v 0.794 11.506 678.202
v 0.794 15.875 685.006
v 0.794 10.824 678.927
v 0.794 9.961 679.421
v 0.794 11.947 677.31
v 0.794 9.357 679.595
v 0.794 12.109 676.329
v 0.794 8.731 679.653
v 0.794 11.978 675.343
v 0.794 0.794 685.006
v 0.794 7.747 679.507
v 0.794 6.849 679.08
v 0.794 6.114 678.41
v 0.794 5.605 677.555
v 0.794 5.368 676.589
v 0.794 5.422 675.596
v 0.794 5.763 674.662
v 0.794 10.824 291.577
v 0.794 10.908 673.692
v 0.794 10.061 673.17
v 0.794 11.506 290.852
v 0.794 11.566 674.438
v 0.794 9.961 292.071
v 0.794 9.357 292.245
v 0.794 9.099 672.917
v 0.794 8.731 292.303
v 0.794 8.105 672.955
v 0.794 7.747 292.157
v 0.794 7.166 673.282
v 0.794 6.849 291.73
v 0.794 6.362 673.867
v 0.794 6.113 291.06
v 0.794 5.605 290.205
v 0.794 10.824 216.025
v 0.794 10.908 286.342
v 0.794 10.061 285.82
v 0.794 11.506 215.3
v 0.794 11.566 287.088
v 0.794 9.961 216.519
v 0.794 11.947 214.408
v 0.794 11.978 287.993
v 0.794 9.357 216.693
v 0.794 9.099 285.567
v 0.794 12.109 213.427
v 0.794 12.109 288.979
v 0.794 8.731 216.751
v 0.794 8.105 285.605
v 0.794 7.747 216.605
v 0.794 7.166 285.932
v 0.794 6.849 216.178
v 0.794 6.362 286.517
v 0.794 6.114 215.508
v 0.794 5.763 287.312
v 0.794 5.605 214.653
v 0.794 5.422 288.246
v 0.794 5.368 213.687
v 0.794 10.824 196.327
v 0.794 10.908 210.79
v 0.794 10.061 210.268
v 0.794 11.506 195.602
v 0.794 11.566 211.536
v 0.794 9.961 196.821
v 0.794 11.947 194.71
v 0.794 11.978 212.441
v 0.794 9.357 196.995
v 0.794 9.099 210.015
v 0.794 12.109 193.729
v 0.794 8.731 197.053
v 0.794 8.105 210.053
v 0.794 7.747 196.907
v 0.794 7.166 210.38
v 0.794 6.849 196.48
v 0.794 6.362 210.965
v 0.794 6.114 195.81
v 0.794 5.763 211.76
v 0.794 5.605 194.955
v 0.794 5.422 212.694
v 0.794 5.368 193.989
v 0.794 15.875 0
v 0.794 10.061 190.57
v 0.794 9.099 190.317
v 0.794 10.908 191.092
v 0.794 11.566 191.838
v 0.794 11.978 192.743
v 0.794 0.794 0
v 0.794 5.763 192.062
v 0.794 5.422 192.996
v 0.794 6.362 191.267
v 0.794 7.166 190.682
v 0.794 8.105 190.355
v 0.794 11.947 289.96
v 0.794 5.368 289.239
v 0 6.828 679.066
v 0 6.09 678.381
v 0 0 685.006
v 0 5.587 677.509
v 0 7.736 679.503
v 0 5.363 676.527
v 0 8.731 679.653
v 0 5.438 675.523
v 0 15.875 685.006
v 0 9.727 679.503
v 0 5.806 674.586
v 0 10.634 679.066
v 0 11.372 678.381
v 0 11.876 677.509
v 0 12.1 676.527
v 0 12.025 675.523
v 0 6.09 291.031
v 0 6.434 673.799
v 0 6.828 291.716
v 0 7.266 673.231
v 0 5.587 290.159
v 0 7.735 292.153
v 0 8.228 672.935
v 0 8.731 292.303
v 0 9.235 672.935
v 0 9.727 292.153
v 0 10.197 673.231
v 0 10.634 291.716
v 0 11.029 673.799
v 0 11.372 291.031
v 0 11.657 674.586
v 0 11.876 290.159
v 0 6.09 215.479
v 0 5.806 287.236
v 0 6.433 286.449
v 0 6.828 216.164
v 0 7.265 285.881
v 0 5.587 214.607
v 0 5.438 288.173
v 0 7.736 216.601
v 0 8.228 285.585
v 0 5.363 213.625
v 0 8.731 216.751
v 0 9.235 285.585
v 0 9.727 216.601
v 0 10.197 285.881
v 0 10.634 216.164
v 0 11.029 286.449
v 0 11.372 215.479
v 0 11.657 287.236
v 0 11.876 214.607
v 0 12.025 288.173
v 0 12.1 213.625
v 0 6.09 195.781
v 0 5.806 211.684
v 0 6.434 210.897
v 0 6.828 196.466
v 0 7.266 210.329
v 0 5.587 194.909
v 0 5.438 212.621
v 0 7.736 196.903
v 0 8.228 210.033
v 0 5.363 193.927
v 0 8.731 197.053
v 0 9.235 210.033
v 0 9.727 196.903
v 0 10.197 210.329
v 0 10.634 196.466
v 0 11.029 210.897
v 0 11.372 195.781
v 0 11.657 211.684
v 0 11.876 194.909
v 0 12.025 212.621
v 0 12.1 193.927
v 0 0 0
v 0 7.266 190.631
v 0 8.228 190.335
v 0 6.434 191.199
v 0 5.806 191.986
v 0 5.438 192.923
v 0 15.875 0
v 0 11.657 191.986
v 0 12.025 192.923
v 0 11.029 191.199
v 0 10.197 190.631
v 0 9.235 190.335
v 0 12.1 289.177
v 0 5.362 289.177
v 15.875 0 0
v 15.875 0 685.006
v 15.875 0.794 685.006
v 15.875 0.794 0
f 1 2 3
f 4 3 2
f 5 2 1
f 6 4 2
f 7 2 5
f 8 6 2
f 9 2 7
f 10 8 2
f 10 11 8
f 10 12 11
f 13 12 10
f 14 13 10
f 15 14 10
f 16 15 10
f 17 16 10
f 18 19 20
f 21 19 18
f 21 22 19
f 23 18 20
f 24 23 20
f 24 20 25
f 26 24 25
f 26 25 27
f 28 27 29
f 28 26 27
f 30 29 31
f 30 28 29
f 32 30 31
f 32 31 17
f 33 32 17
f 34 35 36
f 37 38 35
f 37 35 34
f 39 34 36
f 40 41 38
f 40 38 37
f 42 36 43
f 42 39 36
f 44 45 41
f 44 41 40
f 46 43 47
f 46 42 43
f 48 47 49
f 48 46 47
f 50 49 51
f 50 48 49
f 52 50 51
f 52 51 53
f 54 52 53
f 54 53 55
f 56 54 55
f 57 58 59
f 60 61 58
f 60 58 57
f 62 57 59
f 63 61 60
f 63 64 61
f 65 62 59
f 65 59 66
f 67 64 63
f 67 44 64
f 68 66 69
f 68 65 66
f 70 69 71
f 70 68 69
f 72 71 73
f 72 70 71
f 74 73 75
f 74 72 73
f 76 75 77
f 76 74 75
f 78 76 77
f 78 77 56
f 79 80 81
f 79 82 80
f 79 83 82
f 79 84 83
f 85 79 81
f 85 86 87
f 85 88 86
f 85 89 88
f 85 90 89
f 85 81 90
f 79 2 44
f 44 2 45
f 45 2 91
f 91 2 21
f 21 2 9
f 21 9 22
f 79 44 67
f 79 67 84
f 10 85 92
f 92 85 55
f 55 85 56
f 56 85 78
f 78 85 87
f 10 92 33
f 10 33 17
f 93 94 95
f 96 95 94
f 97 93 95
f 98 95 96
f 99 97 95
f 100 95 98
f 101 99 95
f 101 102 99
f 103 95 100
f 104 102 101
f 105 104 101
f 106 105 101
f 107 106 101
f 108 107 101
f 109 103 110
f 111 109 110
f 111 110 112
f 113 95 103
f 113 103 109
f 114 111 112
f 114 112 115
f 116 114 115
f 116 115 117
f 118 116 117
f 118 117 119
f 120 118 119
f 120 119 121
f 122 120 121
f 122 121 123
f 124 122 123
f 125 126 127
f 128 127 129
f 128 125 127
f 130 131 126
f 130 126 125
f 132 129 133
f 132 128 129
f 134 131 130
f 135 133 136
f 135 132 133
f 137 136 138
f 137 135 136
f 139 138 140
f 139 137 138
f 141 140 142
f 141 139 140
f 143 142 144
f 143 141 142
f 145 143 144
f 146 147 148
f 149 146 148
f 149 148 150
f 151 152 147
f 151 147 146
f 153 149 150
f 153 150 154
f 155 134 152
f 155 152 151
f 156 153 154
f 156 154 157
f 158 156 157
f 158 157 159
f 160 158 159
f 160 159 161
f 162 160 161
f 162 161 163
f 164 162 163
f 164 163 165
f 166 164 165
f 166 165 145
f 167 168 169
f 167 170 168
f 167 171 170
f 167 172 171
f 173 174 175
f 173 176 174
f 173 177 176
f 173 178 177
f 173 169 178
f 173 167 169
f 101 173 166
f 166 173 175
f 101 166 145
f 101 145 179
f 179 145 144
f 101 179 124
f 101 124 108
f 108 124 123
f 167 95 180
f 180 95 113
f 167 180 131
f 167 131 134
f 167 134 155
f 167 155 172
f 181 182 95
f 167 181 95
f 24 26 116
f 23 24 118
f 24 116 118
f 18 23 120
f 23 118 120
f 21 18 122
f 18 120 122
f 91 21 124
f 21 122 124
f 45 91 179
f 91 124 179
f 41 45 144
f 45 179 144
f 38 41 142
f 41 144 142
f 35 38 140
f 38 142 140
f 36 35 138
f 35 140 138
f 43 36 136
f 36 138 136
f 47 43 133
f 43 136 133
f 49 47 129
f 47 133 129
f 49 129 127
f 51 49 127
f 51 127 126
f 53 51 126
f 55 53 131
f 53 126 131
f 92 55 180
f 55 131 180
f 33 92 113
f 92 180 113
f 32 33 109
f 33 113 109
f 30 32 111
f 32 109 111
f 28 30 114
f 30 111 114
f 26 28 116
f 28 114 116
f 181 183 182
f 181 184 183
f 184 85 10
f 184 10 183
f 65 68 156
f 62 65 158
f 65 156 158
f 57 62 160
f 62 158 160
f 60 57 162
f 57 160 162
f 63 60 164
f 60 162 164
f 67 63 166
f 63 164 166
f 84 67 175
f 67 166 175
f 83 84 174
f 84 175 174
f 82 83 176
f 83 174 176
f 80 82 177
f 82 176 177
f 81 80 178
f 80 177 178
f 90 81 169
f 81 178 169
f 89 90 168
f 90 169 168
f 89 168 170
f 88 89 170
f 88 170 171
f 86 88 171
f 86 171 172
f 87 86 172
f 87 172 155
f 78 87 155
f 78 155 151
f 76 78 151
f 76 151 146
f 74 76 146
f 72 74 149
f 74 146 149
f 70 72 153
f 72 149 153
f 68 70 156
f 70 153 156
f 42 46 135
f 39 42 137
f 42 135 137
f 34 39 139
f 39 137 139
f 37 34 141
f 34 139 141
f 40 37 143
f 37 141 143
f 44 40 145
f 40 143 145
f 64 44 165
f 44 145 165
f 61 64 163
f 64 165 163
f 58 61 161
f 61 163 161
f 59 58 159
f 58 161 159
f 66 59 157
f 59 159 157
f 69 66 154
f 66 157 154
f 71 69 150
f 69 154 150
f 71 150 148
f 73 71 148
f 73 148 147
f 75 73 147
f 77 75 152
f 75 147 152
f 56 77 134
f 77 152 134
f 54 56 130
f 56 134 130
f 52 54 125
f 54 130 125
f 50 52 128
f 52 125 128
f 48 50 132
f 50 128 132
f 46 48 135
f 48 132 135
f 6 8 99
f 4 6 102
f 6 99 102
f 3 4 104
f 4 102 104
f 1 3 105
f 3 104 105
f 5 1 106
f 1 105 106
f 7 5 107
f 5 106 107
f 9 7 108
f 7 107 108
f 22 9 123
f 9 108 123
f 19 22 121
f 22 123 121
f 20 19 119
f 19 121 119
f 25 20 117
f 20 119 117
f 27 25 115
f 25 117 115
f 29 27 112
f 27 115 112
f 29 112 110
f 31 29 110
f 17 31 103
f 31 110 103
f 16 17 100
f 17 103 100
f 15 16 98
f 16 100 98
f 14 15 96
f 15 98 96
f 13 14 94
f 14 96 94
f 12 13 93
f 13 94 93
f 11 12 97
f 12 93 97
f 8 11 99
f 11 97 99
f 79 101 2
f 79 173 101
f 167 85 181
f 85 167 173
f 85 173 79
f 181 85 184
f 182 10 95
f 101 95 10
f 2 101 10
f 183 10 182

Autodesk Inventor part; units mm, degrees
ref_plane "YZ Plane" through (0, 0, 0) normal (1, 0, 0) x (0, 1, 0)
ref_plane "XZ Plane" through (0, 0, 0) normal (0, 1, 0) x (-1, 0, 0)
ref_plane "XY Plane" through (0, 0, 0) normal (0, 0, 1) x (1, 0, 0)
sketch "Sketch1" plane through (0, 0, 0) normal (0, 0, 1) x (1, 0, 0)
  line L0 (0, 0) -> (0, 15.875)
  line L1 (0, 15.875) -> (0.7937, 15.875)
  line L2 (0.7937, 15.875) -> (0.7938, 0.7937)
  line L3 (0.7938, 0.7937) -> (15.875, 0.7937)
  line L4 (15.875, 0.7937) -> (15.875, 0)
  line L5 (15.875, 0) -> (0, 0)
  dimension "d0" = 15.875
  dimension "d1" = 0.7937
extrude "Extrusion1" add sketch "Sketch1" along normal blind 685.0063
sketch "Sketch2" plane through (0, 0, 0) normal (-1, 0, 0) x (0, 0, 1)
  line L0 (288.925, 278.403) -> (593.725, 278.403) construction
  arc A0 (593.725, 278.403) -> (593.725, 285.1594) centre (593.725, 281.7812) ccw construction
  line L1 (593.725, 285.1594) -> (288.925, 285.1594) construction
  arc A1 (288.925, 285.1594) -> (288.925, 278.403) centre (288.925, 281.7812) ccw construction
  circle A2 centre (657.225, 281.7812) radius 3.3782 construction
  circle A3 centre (625.475, 281.7812) radius 3.3782 construction
  line L2 (669.925, 294.4812) -> (669.925, 484.9812) construction
  line L3 (669.925, 484.9812) -> (200.025, 484.9812) construction
  line L4 (200.025, 484.9812) -> (200.025, 294.4812) construction
  line L5 (200.025, 294.4812) -> (669.925, 294.4812) construction
  line L6 (288.925, 151.403) -> (593.725, 151.403) construction
  arc A4 (593.725, 151.403) -> (593.725, 158.1594) centre (593.725, 154.7812) ccw construction
  line L7 (593.725, 158.1594) -> (288.925, 158.1594) construction
  arc A5 (288.925, 158.1594) -> (288.925, 151.403) centre (288.925, 154.7812) ccw construction
  ellipse E0 centre (657.225, 154.7796) end of major axis (653.8468, 154.7796) minor radius 3.3782 construction
  ellipse E1 centre (625.475, 154.7796) end of major axis (628.8532, 154.7796) minor radius 3.3782 construction
  line L8 (669.925, 269.0812) -> (200.025, 269.0812) construction
  line L9 (200.025, 269.0812) -> (200.025, 167.4812) construction
  line L10 (200.025, 167.4812) -> (669.925, 167.4812) construction
  line L11 (669.925, 167.4812) -> (669.925, 269.0812) construction
  line L12 (669.925, 15.0813) -> (669.925, 142.0812) construction
  line L13 (669.925, 142.0812) -> (200.025, 142.0812) construction
  line L14 (200.025, 142.0812) -> (200.025, 15.0813) construction
  line L15 (200.025, 15.0813) -> (669.925, 15.0813) construction
  circle A6 centre (676.275, 396.0812) radius 3.3782 construction
  circle A7 centre (193.675, 396.0812) radius 3.3782 construction
  circle A8 centre (676.275, 407.9875) radius 3.3782 construction
  circle A9 centre (193.675, 407.9875) radius 3.3782 construction
  circle A10 centre (676.275, 419.8937) radius 3.3782 construction
  circle A11 centre (193.675, 419.8937) radius 3.3782 construction
  circle A12 centre (676.275, 431.8) radius 3.3782 construction
  circle A13 centre (193.675, 431.8) radius 3.3782 construction
  circle A14 centre (676.275, 443.7062) radius 3.3782 construction
  circle A15 centre (193.675, 443.7062) radius 3.3782 construction
  circle A16 centre (676.275, 455.6125) radius 3.3782 construction
  circle A17 centre (193.675, 455.6125) radius 3.3782 construction
  circle A18 centre (676.275, 467.5187) radius 3.3782 construction
  circle A19 centre (193.675, 467.5187) radius 3.3782 construction
  circle A20 centre (676.275, 479.425) radius 3.3782 construction
  circle A21 centre (193.675, 479.425) radius 3.3782 construction
  circle A22 centre (676.275, 385.0141) radius 3.3782 construction
  circle A23 centre (193.675, 385.0141) radius 3.3782 construction
  circle A24 centre (676.275, 373.947) radius 3.3782 construction
  circle A25 centre (193.675, 373.947) radius 3.3782 construction
  circle A26 centre (676.275, 362.8798) radius 3.3782 construction
  circle A27 centre (193.675, 362.8798) radius 3.3782 construction
  circle A28 centre (676.275, 351.8127) radius 3.3782 construction
  circle A29 centre (193.675, 351.8127) radius 3.3782 construction
  circle A30 centre (676.275, 340.7455) radius 3.3782 construction
  circle A31 centre (193.675, 340.7455) radius 3.3782 construction
  circle A32 centre (676.275, 329.6784) radius 3.3782 construction
  circle A33 centre (193.675, 329.6784) radius 3.3782 construction
  circle A34 centre (676.275, 318.6112) radius 3.3782 construction
  circle A35 centre (193.675, 318.6112) radius 3.3782 construction
  circle A36 centre (676.275, 307.5441) radius 3.3782 construction
  circle A37 centre (193.675, 307.5441) radius 3.3782 construction
  circle A38 centre (676.275, 296.477) radius 3.3782 construction
  circle A39 centre (193.675, 296.477) radius 3.3782 construction
  circle A40 centre (676.275, 285.4098) radius 3.3782 construction
  circle A41 centre (193.675, 285.4098) radius 3.3782 construction
  circle A42 centre (676.275, 274.3427) radius 3.3782 construction
  circle A43 centre (193.675, 274.3427) radius 3.3782 construction
  circle A44 centre (676.275, 263.2755) radius 3.3782 construction
  circle A45 centre (193.675, 263.2755) radius 3.3782 construction
  circle A46 centre (676.275, 252.2084) radius 3.3782 construction
  circle A47 centre (193.675, 252.2084) radius 3.3782 construction
  circle A48 centre (676.275, 241.1412) radius 3.3782 construction
  circle A49 centre (193.675, 241.1412) radius 3.3782 construction
  circle A50 centre (676.275, 230.0741) radius 3.3782 construction
  circle A51 centre (193.675, 230.0741) radius 3.3782 construction
  circle A52 centre (676.275, 219.007) radius 3.3782 construction
  circle A53 centre (193.675, 219.007) radius 3.3782 construction
  circle A54 centre (676.275, 207.9398) radius 3.3782 construction
  circle A55 centre (193.675, 207.9398) radius 3.3782 construction
  circle A56 centre (676.275, 196.8727) radius 3.3782 construction
  circle A57 centre (193.675, 196.8727) radius 3.3782 construction
  circle A58 centre (676.275, 185.8055) radius 3.3782 construction
  circle A59 centre (193.675, 185.8055) radius 3.3782 construction
  circle A60 centre (676.275, 174.7384) radius 3.3782 construction
  circle A61 centre (193.675, 174.7384) radius 3.3782 construction
  circle A62 centre (676.275, 163.6712) radius 3.3782 construction
  circle A63 centre (193.675, 163.6712) radius 3.3782 construction
  circle A64 centre (676.275, 152.6041) radius 3.3782 construction
  circle A65 centre (193.675, 152.6041) radius 3.3782 construction
  circle A66 centre (676.275, 141.537) radius 3.3782 construction
  circle A67 centre (193.675, 141.537) radius 3.3782 construction
  circle A68 centre (676.275, 130.4698) radius 3.3782 construction
  circle A69 centre (193.675, 130.4698) radius 3.3782 construction
  circle A70 centre (676.275, 119.4027) radius 3.3782 construction
  circle A71 centre (193.675, 119.4027) radius 3.3782 construction
  circle A72 centre (676.275, 108.3355) radius 3.3782 construction
  circle A73 centre (193.675, 108.3355) radius 3.3782 construction
  circle A74 centre (676.275, 97.2684) radius 3.3782 construction
  circle A75 centre (193.675, 97.2684) radius 3.3782 construction
  circle A76 centre (676.275, 86.2012) radius 3.3782 construction
  circle A77 centre (193.675, 86.2012) radius 3.3782 construction
  circle A78 centre (676.275, 75.1341) radius 3.3782 construction
  circle A79 centre (193.675, 75.1341) radius 3.3782 construction
  circle A80 centre (676.275, 64.067) radius 3.3782 construction
  circle A81 centre (193.675, 64.067) radius 3.3782 construction
  circle A82 centre (676.275, 52.9998) radius 3.3782 construction
  circle A83 centre (193.675, 52.9998) radius 3.3782 construction
  circle A84 centre (676.275, 41.9327) radius 3.3782 construction
  circle A85 centre (193.675, 41.9327) radius 3.3782 construction
  circle A86 centre (676.275, 30.8655) radius 3.3782 construction
  circle A87 centre (193.675, 30.8655) radius 3.3782 construction
  circle A88 centre (676.275, 19.7984) radius 3.3782 construction
  circle A89 centre (193.675, 19.7984) radius 3.3782 construction
  circle A90 centre (676.275, 491.3312) radius 3.3782 construction
  circle A91 centre (666.426, 491.3312) radius 3.3782 construction
  circle A92 centre (656.577, 491.3312) radius 3.3782 construction
  circle A93 centre (646.7281, 491.3312) radius 3.3782 construction
  circle A94 centre (636.8791, 491.3312) radius 3.3782 construction
  circle A95 centre (627.0301, 491.3312) radius 3.3782 construction
  circle A96 centre (617.1811, 491.3312) radius 3.3782 construction
  circle A97 centre (607.3321, 491.3312) radius 3.3782 construction
  circle A98 centre (597.4832, 491.3312) radius 3.3782 construction
  circle A99 centre (587.6342, 491.3312) radius 3.3782 construction
  circle A100 centre (577.7852, 491.3312) radius 3.3782 construction
  circle A101 centre (567.9362, 491.3312) radius 3.3782 construction
  circle A102 centre (558.0872, 491.3312) radius 3.3782 construction
  circle A103 centre (548.2383, 491.3312) radius 3.3782 construction
  circle A104 centre (538.3893, 491.3312) radius 3.3782 construction
  circle A105 centre (528.5403, 491.3312) radius 3.3782 construction
  circle A106 centre (518.6913, 491.3312) radius 3.3782 construction
  circle A107 centre (508.8423, 491.3312) radius 3.3782 construction
  circle A108 centre (498.9934, 491.3312) radius 3.3782 construction
  circle A109 centre (489.1444, 491.3312) radius 3.3782 construction
  circle A110 centre (479.2954, 491.3312) radius 3.3782 construction
  circle A111 centre (469.4464, 491.3312) radius 3.3782 construction
  circle A112 centre (459.5974, 491.3312) radius 3.3782 construction
  circle A113 centre (449.7485, 491.3312) radius 3.3782 construction
  circle A114 centre (439.8995, 491.3312) radius 3.3782 construction
  circle A115 centre (430.0505, 491.3312) radius 3.3782 construction
  circle A116 centre (420.2015, 491.3312) radius 3.3782 construction
  circle A117 centre (410.3526, 491.3312) radius 3.3782 construction
  circle A118 centre (400.5036, 491.3312) radius 3.3782 construction
  circle A119 centre (390.6546, 491.3312) radius 3.3782 construction
  circle A120 centre (380.8056, 491.3312) radius 3.3782 construction
  circle A121 centre (370.9566, 491.3312) radius 3.3782 construction
  circle A122 centre (361.1077, 491.3312) radius 3.3782 construction
  circle A123 centre (351.2587, 491.3312) radius 3.3782 construction
  circle A124 centre (341.4097, 491.3312) radius 3.3782 construction
  circle A125 centre (331.5607, 491.3312) radius 3.3782 construction
  circle A126 centre (321.7117, 491.3312) radius 3.3782 construction
  circle A127 centre (311.8628, 491.3312) radius 3.3782 construction
  circle A128 centre (302.0138, 491.3312) radius 3.3782 construction
  circle A129 centre (292.1648, 491.3312) radius 3.3782 construction
  circle A130 centre (282.3158, 491.3312) radius 3.3782 construction
  circle A131 centre (272.4668, 491.3312) radius 3.3782 construction
  circle A132 centre (262.6179, 491.3312) radius 3.3782 construction
  circle A133 centre (252.7689, 491.3312) radius 3.3782 construction
  circle A134 centre (242.9199, 491.3312) radius 3.3782 construction
  circle A135 centre (233.0709, 491.3312) radius 3.3782 construction
  circle A136 centre (223.2219, 491.3312) radius 3.3782 construction
  circle A137 centre (213.373, 491.3312) radius 3.3782 construction
  circle A138 centre (203.524, 491.3312) radius 3.3782 construction
  circle A139 centre (193.675, 491.3312) radius 3.3782 construction
  circle A140 centre (676.275, 8.7313) radius 3.3782 projected
  circle A141 centre (666.426, 8.7313) radius 3.3782 construction
  circle A142 centre (656.577, 8.7313) radius 3.3782 construction
  circle A143 centre (646.7281, 8.7313) radius 3.3782 construction
  circle A144 centre (636.8791, 8.7313) radius 3.3782 construction
  circle A145 centre (627.0301, 8.7313) radius 3.3782 construction
  circle A146 centre (617.1811, 8.7313) radius 3.3782 construction
  circle A147 centre (607.3321, 8.7313) radius 3.3782 construction
  circle A148 centre (597.4832, 8.7313) radius 3.3782 construction
  circle A149 centre (587.6342, 8.7313) radius 3.3782 construction
  circle A150 centre (577.7852, 8.7313) radius 3.3782 construction
  circle A151 centre (567.9362, 8.7313) radius 3.3782 construction
  circle A152 centre (558.0872, 8.7313) radius 3.3782 construction
  circle A153 centre (548.2383, 8.7313) radius 3.3782 construction
  circle A154 centre (538.3893, 8.7313) radius 3.3782 construction
  circle A155 centre (528.5403, 8.7313) radius 3.3782 construction
  circle A156 centre (518.6913, 8.7313) radius 3.3782 construction
  circle A157 centre (508.8423, 8.7313) radius 3.3782 construction
  circle A158 centre (498.9934, 8.7313) radius 3.3782 construction
  circle A159 centre (489.1444, 8.7313) radius 3.3782 construction
  circle A160 centre (479.2954, 8.7313) radius 3.3782 construction
  circle A161 centre (469.4464, 8.7313) radius 3.3782 construction
  circle A162 centre (459.5974, 8.7313) radius 3.3782 construction
  circle A163 centre (449.7485, 8.7313) radius 3.3782 construction
  circle A164 centre (439.8995, 8.7313) radius 3.3782 construction
  circle A165 centre (430.0505, 8.7313) radius 3.3782 construction
  circle A166 centre (420.2015, 8.7313) radius 3.3782 construction
  circle A167 centre (410.3526, 8.7313) radius 3.3782 construction
  circle A168 centre (400.5036, 8.7313) radius 3.3782 construction
  circle A169 centre (390.6546, 8.7313) radius 3.3782 construction
  circle A170 centre (380.8056, 8.7313) radius 3.3782 construction
  circle A171 centre (370.9566, 8.7313) radius 3.3782 construction
  circle A172 centre (361.1077, 8.7313) radius 3.3782 construction
  circle A173 centre (351.2587, 8.7313) radius 3.3782 construction
  circle A174 centre (341.4097, 8.7313) radius 3.3782 construction
  circle A175 centre (331.5607, 8.7313) radius 3.3782 construction
  circle A176 centre (321.7117, 8.7313) radius 3.3782 construction
  circle A177 centre (311.8628, 8.7313) radius 3.3782 construction
  circle A178 centre (302.0138, 8.7313) radius 3.3782 construction
  circle A179 centre (272.4668, 8.7313) radius 3.3782 construction
  circle A180 centre (262.6179, 8.7313) radius 3.3782 construction
  circle A181 centre (252.7689, 8.7313) radius 3.3782 construction
  circle A182 centre (242.9199, 8.7313) radius 3.3782 construction
  circle A183 centre (233.0709, 8.7313) radius 3.3782 construction
  circle A184 centre (223.2219, 8.7313) radius 3.3782 construction
  circle A185 centre (213.373, 8.7313) radius 3.3782 projected
  circle A186 centre (203.524, 8.7313) radius 3.3782 construction
  circle A187 centre (193.675, 8.7313) radius 3.3782 projected
  line L16 (682.625, 2.3813) -> (187.325, 2.3813) construction
  line L17 (187.325, 2.3813) -> (187.325, 497.6812) construction
  line L18 (187.325, 497.6812) -> (682.625, 497.6812) construction
  line L19 (682.625, 497.6812) -> (682.625, 2.3813) construction
  circle A188 centre (477.7908, 396.0812) radius 3.3782 construction
  circle A189 centre (398.6756, 286.3307) radius 3.3782 construction
  circle A190 centre (422.4733, 262.533) radius 3.3782 construction
  circle A191 centre (444.1358, 396.0812) radius 3.3782 construction
  line L20 (418.0849, 248.9608) -> (558.1878, 108.8579) construction
  arc A192 (558.1878, 108.8579) -> (576.1483, 126.8184) centre (288.925, 396.0812) ccw construction
  line L21 (576.1483, 126.8184) -> (323.3053, 379.6615) construction
  arc A193 (323.3053, 379.6615) -> (326.4921, 389.7312) centre (288.925, 396.0812) ccw construction
  line L22 (326.4921, 389.7312) -> (682.5738, 389.7312) construction
  arc A194 (682.5738, 389.7312) -> (682.625, 396.0812) centre (288.925, 396.0812) ccw construction
  line L23 (682.625, 396.0812) -> (682.625, 402.4312) construction
  line L24 (682.625, 402.4312) -> (326.4921, 402.4312) construction
  arc A195 (326.4921, 402.4312) -> (282.575, 358.5141) centre (288.925, 396.0812) ccw construction
  line L25 (282.575, 358.5141) -> (282.575, 296.4095) construction
  arc A196 (295.275, 281.641) -> (282.575, 296.4095) centre (178.435, 194.011) ccw construction
  line L26 (295.275, 281.641) -> (360.9975, 194.011) construction
  line L27 (360.9975, 194.011) -> (295.275, 106.381) construction
  arc A197 (282.575, 91.6124) -> (295.275, 106.381) centre (178.435, 194.011) ccw construction
  line L28 (282.575, 91.6124) -> (282.575, 2.3812) construction
  line L29 (282.575, 2.3812) -> (288.925, 2.3812) construction
  arc A198 (288.925, 2.3812) -> (295.275, 2.4325) centre (288.925, 396.0812) ccw construction
  line L30 (295.275, 2.4325) -> (295.275, 85.2143) construction
  line L31 (295.275, 85.2143) -> (418.0849, 248.9608) construction
  circle A199 centre (288.925, 8.7312) radius 3.3782 projected
  circle A200 centre (288.925, 59.5312) radius 3.3782 construction
  line L32 (409.0135, 258.0323) -> (368.935, 204.5943) construction
  line L33 (368.935, 204.5943) -> (295.275, 302.8076) construction
  line L34 (295.275, 302.8076) -> (295.275, 358.5141) construction
  arc A201 (295.275, 358.5141) -> (305.3447, 361.701) centre (288.925, 396.0812) ccw construction
  line L35 (305.3447, 361.701) -> (409.0135, 258.0323) construction
  circle A202 centre (288.925, 396.0812) radius 9.5 construction
  circle A203 centre (559.1526, 118.5617) radius 3.3782 construction
  circle A204 centre (566.4445, 125.8537) radius 3.3782 construction
  circle A205 centre (523.2315, 154.4828) radius 3.3782 construction
  circle A206 centre (530.5235, 161.7747) radius 3.3782 construction
  circle A207 centre (676.275, 396.0812) radius 3.3782 construction
  circle A208 centre (625.475, 396.0812) radius 3.3782 construction
  circle A209 centre (428.625, 396.0812) radius 3.3782 construction
  circle A210 centre (568.325, 396.0812) radius 3.3782 construction
  circle A211 centre (383.1156, 292.9104) radius 3.3782 construction
  circle A212 centre (392.0958, 301.8907) radius 3.3782 construction
  circle A213 centre (481.9495, 194.0765) radius 3.3782 construction
  circle A214 centre (490.9297, 203.0568) radius 3.3782 construction
  arc A215 (291.0239, 5.5515) -> (291.0239, 11.911) centre (292.1648, 8.7313) ccw projected
  arc A216 (285.3856, 10.1415) -> (285.3856, 7.321) centre (282.3158, 8.7313) ccw projected
  arc A217 (291.0239, 11.911) -> (285.3856, 10.1415) centre (288.925, 8.7312) ccw projected
  arc A218 (285.3856, 7.321) -> (291.0239, 5.5515) centre (288.925, 8.7312) ccw projected
extrude "Extrusion2" cut sketch "Sketch2" against normal through all contours A140 | A185 | A187 | A199
properties part number "Shooter Back Support Bar" material "Aluminum 6061"
